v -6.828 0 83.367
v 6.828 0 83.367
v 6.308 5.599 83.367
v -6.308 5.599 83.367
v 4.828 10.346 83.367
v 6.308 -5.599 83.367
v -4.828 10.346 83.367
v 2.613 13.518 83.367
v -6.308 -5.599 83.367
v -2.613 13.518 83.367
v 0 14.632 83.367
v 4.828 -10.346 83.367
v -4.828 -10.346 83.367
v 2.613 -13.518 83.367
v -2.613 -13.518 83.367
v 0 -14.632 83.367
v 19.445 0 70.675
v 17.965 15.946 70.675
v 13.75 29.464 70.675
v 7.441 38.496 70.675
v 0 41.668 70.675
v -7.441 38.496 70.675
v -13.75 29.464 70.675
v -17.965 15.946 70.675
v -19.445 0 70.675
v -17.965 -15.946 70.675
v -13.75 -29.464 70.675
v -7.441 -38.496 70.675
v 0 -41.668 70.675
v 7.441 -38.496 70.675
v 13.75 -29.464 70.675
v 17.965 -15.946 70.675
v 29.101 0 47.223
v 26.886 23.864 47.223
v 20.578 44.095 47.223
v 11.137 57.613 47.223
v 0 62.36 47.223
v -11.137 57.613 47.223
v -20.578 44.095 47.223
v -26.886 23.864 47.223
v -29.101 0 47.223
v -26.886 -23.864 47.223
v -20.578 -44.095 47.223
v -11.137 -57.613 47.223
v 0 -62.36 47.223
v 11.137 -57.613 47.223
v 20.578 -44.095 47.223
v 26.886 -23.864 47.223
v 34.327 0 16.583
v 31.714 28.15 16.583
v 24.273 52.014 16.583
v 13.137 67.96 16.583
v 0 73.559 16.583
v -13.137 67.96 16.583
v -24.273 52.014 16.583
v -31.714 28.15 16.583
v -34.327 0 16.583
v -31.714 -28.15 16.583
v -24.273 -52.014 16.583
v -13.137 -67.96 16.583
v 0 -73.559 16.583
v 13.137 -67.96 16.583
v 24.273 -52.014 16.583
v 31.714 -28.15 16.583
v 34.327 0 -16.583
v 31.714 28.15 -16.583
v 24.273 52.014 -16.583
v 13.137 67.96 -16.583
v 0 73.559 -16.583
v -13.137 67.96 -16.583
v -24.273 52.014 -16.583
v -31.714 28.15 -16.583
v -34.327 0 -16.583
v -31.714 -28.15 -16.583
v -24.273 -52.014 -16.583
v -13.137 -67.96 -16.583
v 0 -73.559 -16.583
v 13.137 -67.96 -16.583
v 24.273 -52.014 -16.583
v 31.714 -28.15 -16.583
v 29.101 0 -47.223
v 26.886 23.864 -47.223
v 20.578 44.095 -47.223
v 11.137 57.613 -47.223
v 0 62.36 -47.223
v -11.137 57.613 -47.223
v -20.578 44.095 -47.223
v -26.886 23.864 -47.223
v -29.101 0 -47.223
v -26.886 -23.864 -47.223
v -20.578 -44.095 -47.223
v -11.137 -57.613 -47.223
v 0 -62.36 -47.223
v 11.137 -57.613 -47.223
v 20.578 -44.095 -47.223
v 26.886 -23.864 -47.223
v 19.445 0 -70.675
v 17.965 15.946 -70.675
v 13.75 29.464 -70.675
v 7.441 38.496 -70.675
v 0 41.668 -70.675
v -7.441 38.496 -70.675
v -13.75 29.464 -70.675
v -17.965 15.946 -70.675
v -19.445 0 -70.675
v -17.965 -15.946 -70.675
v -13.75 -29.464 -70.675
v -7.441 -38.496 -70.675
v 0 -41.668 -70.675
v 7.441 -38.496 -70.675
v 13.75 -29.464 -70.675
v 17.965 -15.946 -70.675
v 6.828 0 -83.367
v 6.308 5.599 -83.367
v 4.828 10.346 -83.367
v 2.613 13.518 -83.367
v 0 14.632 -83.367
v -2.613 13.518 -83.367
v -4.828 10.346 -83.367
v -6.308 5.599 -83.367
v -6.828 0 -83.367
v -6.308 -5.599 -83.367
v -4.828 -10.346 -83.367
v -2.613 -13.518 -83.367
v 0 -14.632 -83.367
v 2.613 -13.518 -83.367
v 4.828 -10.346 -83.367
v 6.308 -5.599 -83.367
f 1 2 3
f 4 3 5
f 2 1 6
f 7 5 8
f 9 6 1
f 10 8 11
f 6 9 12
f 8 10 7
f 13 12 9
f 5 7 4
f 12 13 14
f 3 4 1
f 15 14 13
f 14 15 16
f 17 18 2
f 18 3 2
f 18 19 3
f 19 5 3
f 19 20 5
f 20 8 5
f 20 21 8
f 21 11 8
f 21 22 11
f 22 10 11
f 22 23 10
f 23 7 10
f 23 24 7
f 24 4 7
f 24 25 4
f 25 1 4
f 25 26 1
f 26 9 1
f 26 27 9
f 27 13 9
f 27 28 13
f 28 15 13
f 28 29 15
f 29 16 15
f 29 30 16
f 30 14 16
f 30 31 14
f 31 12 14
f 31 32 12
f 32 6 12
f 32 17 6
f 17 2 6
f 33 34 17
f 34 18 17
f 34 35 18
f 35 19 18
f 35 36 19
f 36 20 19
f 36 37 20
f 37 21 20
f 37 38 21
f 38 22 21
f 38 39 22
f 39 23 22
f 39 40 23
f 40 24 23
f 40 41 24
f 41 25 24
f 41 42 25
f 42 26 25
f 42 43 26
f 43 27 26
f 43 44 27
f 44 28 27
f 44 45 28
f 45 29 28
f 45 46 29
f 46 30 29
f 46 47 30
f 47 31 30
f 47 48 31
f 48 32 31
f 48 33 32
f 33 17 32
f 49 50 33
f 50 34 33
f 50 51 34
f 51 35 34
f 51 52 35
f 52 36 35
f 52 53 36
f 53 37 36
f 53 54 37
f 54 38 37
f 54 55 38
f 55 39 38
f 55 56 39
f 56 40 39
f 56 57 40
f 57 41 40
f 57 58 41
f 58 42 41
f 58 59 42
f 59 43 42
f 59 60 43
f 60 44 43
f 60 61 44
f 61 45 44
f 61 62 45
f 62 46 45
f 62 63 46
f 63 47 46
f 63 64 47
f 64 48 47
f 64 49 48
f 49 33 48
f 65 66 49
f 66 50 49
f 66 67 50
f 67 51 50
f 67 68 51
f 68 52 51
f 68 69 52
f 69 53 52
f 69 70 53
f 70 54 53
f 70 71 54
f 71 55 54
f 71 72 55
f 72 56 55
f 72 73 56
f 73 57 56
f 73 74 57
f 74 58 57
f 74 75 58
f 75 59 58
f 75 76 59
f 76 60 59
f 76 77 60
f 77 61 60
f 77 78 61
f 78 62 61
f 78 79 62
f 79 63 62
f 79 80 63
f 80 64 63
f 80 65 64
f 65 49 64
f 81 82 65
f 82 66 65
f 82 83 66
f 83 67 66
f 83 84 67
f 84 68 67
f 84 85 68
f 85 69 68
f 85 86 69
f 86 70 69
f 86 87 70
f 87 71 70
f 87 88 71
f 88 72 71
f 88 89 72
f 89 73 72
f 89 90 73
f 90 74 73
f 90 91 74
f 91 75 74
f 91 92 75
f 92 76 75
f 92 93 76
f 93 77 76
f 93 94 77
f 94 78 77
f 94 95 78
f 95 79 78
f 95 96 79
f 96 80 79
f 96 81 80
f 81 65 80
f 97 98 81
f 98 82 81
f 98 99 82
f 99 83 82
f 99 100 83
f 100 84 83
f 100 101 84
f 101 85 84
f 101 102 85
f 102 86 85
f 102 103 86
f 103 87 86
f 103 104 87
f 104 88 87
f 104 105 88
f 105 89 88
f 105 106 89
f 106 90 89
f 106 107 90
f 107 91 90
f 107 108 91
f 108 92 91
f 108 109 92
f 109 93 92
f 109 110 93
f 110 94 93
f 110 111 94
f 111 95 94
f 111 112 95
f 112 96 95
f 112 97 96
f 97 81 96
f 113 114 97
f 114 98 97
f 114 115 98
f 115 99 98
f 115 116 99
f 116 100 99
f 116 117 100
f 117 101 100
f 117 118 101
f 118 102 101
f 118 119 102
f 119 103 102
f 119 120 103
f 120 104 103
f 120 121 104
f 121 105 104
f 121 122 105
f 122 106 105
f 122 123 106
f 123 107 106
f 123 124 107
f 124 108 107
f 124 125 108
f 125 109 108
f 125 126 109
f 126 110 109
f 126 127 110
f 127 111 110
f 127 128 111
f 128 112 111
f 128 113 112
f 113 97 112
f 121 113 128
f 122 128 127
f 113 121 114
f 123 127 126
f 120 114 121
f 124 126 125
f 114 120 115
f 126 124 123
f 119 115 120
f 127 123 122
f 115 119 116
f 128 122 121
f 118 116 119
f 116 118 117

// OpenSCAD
// Generated by SolidPython 1.0.1 on 2020-07-29 00:46:48


scale(v = [7, 15, 17]) {
	sphere(r = 5);
}
/***********************************************
*********      SolidPython code:      **********
************************************************
 
# import packages: SolidPython
from solid import *
from solid.utils import *
from itertools import chain, combinations, permutations


class Resize:

    def __init__(self, scad_file):
        self.scad_file = scad_file
        #self.scad_file = import_scad(scad_file)
        # cone/cylinder param:
        self.r1 = 0
        self.r2 = 0
        self.h = 0
        # rectangular prism param:
        self.w = 0
        self.l = 0
        # ellipse param:
        self.r = 0

    # import OpenScad code (file name corresponds to shape)


    # classify shape + parameters
    def assign(self, param1, param2, param3):
        if self.scad_file == 'cone.scad':
            self.r1 = param1
            self.r2 = param2
            self.h = param3
        elif self.scad_file == 'cylinder.scad':
            self.r1 = param1
            self.r2 = param2
            self.h = param3
        elif self.scad_file == 'rectangularPrism.scad':
            self.h = param1
            self.l = param2
            self.w = param3
        else:
            self.r = param1
            self.h = param2

    # resize parameters
    def iterate(self):
        x = range(3, 20, 2)
        i = 1
        if self.scad_file == 'cone.scad':
            tempList = list(permutations(x, 2))
            for temp in tempList:
                param1 = temp[0]
                param2 = temp[1]
                filepath = 'produced_scad_files/' + 'cone' + str(param1) + '_' + str(param2) + '_' + '.scad'
                scad_render_to_file(cylinder(h=param1, r1=param2, r2=0), filepath)

        elif self.scad_file == 'cylinder.scad':
            tempList = list(permutations(x, 3))
            for temp in tempList:
                param1 = temp[0]
                param2 = temp[1]
                filepath = 'produced_scad_files/' + 'cylinder' + str(param1) + '_' + str(param2) + '_' + '.scad'
                scad_render_to_file(cylinder(h=param1, r1=param2, r2=param2), filepath)

        elif self.scad_file == 'rectangularPrism.scad':
            tempList = list(permutations(x, 3))
            for temp in tempList:
                param1 = temp[0]
                param2 = temp[1]
                param3 = temp[2]
                filepath = 'produced_scad_files/' + 'rectangularPrism' + str(param1) + '_' + str(param2) + '_' + str(
                    param3) + '.scad'
                scad_render_to_file(cube(size=(param1, param2, param3)), filepath)

        elif self.scad_file == 'ellipse.scad':
            tempList = list(permutations(x, 4))
            for temp in tempList:
                param1 = temp[0]
                param2 = temp[1]
                param3 = temp[2]
                param4 = temp[3]
                filepath = 'produced_scad_files/' + 'ellipse' + str(param1) + '_' + str(param2) + '_' + str(param3) + '_' + str(param4) + '.scad'
                scad_render_to_file(scale([param1, param2, param3])(sphere(r=param4)), filepath)

    def render_to_scadfile(self):
        scad_render_to_file(scad, 'example.scad') 
 
************************************************/
